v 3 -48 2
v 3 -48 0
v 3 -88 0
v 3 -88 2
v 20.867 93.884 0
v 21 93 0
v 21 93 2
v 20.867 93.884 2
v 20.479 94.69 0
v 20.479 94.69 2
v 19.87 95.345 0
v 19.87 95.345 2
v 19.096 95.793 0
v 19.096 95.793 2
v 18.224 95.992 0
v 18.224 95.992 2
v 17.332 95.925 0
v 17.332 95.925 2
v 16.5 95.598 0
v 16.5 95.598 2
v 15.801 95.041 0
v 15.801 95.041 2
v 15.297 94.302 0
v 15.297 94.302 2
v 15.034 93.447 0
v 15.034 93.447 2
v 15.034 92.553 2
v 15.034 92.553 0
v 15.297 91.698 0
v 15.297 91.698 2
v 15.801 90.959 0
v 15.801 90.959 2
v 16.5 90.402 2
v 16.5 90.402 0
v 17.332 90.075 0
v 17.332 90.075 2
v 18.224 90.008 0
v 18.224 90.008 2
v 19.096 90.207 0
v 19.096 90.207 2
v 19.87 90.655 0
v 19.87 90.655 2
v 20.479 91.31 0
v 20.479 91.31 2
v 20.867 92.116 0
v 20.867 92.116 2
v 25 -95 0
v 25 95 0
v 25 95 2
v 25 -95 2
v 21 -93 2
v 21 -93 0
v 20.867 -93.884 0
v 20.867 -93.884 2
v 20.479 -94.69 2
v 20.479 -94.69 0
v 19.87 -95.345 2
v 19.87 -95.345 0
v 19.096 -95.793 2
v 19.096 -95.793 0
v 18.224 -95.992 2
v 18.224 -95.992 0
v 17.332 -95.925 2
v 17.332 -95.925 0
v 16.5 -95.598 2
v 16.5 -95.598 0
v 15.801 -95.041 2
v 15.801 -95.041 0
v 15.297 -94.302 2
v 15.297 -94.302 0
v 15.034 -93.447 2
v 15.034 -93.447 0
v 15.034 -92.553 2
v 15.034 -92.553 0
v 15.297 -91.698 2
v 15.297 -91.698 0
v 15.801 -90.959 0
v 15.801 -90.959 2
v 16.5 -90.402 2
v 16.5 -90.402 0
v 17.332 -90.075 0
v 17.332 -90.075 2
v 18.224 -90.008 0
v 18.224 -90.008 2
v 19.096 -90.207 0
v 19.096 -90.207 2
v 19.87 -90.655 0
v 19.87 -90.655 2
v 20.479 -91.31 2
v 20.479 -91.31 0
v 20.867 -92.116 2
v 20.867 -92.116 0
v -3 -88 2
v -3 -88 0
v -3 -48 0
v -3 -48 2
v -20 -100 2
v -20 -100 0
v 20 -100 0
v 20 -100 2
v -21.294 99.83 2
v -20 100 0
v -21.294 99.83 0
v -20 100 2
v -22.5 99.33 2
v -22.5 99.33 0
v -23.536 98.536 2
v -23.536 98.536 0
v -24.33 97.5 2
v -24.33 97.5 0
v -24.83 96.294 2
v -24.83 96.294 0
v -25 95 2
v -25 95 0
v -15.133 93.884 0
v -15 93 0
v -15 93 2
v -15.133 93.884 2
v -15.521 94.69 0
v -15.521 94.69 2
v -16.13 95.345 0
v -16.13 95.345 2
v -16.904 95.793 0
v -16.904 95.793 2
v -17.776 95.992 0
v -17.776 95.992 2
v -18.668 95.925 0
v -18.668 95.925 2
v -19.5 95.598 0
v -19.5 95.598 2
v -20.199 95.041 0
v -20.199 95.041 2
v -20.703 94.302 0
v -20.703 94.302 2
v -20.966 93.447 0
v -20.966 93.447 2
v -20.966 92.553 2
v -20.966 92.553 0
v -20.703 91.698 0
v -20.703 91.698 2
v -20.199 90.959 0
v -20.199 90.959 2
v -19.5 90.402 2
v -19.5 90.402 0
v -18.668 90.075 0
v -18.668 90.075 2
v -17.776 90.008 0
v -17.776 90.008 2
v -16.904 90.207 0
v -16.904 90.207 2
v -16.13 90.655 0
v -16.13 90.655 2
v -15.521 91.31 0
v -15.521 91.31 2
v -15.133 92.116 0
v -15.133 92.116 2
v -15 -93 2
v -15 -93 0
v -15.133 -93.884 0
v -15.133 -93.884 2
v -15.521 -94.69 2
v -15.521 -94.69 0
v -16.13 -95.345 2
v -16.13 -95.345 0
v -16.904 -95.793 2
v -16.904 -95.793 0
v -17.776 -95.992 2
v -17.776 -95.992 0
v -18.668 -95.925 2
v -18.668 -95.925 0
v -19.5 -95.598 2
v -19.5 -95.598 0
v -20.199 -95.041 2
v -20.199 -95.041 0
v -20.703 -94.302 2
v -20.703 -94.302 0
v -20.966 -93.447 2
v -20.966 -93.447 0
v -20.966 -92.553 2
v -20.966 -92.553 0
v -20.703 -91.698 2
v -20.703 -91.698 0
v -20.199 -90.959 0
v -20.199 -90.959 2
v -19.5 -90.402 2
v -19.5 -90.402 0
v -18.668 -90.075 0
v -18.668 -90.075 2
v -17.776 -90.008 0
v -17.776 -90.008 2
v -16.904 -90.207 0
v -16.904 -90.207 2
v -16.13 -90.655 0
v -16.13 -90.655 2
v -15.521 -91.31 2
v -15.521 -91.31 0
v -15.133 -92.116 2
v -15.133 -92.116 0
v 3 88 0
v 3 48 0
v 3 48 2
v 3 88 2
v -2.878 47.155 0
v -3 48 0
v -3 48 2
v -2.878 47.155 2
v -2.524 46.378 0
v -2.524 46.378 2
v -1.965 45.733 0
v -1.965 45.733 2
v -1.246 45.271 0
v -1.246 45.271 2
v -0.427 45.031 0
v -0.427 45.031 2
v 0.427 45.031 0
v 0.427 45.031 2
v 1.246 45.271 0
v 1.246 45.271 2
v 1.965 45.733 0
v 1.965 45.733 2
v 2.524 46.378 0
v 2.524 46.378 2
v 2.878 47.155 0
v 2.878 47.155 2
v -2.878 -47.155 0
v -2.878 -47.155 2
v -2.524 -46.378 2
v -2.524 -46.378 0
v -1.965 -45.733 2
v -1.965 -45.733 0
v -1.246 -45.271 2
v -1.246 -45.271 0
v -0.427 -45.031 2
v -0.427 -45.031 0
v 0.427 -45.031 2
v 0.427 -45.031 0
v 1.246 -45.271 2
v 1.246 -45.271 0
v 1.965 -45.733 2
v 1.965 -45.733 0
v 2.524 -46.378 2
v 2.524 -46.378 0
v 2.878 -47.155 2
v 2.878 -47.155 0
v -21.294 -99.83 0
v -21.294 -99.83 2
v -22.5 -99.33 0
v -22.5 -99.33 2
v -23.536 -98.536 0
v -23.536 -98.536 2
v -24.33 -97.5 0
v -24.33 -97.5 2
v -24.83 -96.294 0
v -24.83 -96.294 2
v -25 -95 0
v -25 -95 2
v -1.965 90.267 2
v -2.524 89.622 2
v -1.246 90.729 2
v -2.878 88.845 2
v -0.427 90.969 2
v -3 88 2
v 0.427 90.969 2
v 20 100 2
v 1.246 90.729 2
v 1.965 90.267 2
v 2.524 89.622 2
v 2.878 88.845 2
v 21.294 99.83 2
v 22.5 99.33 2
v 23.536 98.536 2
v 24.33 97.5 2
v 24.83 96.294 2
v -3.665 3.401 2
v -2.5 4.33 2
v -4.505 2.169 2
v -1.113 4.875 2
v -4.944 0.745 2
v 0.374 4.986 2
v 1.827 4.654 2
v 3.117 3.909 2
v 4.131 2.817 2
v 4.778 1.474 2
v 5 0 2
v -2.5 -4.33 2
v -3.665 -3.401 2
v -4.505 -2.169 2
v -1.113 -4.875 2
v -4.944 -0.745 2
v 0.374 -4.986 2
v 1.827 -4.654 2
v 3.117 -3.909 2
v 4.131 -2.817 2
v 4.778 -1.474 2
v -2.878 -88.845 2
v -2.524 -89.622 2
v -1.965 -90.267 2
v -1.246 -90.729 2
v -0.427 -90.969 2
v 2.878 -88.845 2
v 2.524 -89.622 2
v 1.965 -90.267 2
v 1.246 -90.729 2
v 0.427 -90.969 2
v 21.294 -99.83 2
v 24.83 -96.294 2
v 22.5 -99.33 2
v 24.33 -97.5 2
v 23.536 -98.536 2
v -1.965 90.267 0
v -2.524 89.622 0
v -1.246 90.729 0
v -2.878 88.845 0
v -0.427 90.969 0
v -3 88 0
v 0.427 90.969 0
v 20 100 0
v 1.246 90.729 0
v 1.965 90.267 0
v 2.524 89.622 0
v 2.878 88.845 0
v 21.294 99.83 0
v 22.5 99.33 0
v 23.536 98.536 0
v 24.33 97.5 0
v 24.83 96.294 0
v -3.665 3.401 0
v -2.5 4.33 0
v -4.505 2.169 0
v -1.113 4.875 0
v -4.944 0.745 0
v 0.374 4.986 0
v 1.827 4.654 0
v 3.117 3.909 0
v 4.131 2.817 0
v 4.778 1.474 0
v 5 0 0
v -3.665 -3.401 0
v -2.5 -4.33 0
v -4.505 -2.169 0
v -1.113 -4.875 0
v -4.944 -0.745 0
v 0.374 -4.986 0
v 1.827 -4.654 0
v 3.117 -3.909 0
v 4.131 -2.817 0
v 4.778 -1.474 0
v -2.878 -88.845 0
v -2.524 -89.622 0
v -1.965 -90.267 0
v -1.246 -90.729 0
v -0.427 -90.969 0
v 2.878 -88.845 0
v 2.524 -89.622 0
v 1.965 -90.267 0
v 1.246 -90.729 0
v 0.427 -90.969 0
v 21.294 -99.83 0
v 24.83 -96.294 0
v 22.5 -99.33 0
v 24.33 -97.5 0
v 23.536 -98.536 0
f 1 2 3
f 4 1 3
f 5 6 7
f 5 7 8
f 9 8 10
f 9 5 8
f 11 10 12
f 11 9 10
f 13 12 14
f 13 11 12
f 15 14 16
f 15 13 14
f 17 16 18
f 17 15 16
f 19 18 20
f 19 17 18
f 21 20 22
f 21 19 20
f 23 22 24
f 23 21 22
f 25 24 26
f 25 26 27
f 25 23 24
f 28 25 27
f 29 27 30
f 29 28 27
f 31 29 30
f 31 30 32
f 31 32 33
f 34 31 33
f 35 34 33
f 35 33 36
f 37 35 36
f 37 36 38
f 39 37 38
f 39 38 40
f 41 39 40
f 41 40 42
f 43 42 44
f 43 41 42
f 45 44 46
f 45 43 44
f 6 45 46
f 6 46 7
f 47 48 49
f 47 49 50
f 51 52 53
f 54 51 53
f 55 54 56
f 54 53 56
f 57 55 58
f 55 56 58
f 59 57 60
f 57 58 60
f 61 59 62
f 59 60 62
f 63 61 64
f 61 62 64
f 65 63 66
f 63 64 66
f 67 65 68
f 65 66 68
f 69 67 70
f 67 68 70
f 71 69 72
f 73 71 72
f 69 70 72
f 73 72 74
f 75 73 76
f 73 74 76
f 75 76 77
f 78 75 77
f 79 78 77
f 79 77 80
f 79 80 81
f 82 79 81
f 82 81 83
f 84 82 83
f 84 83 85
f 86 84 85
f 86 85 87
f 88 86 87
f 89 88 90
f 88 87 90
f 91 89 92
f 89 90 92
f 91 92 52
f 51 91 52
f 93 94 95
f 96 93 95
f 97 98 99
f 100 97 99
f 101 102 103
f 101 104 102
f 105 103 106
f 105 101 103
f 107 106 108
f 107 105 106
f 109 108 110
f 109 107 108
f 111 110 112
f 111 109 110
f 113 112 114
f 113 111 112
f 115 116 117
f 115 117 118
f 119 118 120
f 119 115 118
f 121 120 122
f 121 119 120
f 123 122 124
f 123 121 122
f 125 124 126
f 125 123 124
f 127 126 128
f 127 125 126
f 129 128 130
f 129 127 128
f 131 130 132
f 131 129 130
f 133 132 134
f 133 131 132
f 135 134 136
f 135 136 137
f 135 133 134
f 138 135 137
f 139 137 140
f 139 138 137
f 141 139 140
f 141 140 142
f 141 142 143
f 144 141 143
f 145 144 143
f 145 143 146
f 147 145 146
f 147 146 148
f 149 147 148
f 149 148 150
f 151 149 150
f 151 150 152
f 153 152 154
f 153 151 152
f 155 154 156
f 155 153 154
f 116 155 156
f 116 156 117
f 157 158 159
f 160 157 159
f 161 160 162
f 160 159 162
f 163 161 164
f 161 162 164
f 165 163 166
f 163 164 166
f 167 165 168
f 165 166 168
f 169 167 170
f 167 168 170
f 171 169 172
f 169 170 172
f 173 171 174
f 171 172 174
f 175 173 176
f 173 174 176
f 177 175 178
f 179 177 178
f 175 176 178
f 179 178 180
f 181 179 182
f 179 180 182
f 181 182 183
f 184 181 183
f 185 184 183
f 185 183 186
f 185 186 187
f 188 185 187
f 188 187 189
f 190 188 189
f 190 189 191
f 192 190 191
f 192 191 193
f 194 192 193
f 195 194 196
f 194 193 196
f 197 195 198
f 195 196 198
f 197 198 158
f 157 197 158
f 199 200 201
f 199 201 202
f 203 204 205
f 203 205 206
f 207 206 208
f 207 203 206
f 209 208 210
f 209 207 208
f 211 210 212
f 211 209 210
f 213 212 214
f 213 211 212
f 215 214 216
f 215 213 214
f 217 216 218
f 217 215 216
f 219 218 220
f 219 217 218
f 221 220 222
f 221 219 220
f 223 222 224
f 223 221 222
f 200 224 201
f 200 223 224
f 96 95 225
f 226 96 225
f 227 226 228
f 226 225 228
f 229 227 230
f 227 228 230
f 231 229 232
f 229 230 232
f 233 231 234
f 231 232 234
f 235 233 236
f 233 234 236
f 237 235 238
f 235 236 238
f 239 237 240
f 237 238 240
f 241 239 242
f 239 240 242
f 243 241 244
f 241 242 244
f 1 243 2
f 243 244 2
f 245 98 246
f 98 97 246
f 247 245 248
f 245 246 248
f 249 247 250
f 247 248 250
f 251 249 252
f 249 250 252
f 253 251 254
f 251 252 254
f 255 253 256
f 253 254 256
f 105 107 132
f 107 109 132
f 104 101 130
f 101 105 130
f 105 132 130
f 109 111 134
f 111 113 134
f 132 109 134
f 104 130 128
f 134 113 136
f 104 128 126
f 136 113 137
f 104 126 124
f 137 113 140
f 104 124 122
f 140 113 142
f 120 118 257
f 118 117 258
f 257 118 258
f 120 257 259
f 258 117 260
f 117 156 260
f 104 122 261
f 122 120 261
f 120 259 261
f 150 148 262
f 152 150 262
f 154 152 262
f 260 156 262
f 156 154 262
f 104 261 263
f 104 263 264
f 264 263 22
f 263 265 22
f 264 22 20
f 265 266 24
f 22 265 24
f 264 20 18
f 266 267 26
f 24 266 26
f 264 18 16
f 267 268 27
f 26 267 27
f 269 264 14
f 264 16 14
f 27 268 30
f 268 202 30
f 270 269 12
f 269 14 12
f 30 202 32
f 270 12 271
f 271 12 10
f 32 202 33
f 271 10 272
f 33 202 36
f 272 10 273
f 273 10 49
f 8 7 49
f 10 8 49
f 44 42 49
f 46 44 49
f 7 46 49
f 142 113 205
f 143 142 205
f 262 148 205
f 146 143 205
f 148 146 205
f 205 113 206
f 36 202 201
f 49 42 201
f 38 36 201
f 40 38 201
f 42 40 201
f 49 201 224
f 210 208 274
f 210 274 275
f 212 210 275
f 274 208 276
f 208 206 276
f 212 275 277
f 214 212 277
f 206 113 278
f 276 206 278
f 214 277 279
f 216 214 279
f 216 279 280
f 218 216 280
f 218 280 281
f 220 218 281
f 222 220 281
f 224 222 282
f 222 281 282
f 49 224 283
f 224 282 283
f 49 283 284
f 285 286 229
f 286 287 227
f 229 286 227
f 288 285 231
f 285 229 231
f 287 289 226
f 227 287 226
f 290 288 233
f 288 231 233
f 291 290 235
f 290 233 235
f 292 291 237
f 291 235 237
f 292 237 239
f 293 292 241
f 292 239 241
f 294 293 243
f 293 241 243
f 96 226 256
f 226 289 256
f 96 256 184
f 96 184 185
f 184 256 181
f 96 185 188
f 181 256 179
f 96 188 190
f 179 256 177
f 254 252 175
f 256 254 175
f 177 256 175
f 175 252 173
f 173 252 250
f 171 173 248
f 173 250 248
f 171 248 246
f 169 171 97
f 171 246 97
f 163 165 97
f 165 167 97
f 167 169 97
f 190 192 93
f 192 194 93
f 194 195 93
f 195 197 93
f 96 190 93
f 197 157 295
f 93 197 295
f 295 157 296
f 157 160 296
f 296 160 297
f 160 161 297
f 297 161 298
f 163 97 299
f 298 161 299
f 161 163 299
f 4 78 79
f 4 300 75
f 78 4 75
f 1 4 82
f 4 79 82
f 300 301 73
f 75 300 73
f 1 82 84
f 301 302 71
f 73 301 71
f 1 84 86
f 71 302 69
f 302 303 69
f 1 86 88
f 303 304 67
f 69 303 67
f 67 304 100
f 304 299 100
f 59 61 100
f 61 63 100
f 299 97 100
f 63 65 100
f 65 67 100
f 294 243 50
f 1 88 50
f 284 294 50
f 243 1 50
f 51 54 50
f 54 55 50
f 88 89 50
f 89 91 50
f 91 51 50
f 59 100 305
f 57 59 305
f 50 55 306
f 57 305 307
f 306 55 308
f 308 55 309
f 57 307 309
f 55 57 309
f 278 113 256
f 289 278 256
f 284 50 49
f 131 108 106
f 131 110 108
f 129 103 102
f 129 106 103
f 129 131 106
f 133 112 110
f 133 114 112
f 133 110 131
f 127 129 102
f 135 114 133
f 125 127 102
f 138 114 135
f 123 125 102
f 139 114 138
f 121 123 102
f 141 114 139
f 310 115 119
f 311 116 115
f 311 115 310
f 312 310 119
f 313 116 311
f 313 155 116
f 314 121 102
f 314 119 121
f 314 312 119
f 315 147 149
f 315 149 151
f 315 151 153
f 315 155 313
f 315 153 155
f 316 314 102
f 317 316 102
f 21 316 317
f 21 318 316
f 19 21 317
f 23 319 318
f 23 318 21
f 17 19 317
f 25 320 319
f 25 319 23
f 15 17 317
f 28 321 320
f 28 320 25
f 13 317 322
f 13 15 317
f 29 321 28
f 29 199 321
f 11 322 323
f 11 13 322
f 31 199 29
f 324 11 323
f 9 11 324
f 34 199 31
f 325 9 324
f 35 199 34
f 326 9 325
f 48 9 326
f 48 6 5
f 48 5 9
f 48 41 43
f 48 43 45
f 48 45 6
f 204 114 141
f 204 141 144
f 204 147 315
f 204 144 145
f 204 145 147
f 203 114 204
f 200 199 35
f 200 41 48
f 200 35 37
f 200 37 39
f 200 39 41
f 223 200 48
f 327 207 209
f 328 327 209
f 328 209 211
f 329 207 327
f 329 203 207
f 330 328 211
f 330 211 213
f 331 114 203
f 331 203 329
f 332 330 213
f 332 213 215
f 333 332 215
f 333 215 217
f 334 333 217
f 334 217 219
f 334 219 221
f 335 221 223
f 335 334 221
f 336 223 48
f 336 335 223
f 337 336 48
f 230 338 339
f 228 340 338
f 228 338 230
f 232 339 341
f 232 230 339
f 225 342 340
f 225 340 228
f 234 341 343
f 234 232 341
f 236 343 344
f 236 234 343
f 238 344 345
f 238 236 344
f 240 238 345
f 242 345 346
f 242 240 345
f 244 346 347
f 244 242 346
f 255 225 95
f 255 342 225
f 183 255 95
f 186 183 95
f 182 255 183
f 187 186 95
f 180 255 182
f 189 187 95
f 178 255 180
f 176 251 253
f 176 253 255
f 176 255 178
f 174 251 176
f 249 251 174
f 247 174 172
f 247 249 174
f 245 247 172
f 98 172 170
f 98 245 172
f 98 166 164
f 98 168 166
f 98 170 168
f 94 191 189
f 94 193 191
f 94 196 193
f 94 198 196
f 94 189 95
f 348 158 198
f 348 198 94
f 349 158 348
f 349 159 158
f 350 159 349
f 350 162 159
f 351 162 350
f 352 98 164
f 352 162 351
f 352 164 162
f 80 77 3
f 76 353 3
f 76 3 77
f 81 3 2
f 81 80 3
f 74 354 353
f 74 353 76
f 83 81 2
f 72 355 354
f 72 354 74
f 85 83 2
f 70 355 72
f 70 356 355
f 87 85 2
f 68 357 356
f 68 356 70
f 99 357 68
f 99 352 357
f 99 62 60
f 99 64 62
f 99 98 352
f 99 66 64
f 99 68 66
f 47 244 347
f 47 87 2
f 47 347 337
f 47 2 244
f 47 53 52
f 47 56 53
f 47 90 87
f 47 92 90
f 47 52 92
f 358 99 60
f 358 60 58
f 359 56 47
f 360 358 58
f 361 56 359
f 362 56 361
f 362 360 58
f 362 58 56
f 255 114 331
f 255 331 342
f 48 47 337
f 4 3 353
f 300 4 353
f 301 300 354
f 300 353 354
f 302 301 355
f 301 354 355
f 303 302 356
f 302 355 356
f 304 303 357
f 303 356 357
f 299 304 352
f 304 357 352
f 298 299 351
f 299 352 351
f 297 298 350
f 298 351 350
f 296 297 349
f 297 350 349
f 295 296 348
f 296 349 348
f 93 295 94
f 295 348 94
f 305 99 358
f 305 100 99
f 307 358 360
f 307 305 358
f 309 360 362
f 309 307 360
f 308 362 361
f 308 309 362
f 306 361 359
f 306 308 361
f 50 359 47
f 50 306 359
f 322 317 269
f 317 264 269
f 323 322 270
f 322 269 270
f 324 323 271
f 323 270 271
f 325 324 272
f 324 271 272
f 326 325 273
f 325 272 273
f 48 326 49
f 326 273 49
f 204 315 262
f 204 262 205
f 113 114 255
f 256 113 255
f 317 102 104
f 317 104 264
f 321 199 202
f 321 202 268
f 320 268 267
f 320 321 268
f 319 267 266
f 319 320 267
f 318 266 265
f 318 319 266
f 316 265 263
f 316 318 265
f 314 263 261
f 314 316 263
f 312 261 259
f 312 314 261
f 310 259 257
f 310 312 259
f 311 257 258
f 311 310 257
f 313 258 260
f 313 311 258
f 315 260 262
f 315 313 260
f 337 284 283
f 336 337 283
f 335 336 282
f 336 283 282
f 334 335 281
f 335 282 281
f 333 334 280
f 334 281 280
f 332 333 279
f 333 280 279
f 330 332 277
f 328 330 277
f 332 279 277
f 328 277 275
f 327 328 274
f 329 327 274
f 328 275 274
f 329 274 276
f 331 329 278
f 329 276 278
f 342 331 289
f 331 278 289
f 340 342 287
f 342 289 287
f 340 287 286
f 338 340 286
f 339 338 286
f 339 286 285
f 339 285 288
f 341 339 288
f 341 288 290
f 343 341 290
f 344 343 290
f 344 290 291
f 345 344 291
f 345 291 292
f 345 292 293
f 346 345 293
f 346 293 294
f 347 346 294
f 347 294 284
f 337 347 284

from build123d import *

# Parameters (mm, degrees)
SCHIZZO1_W                   = 50
SCHIZZO1_H                   = 100
SCHIZZO1_R                   = 3
ESTRUSIONE_ESTRUSIONE1_DEPTH = 2
RACCORDO3_R                  = 5
RACCORDO4_R                  = 5
SCHIZZO3_R                   = 5
TAGLIO_ESTRUSIONE1_DEPTH     = 104.097041665


with BuildPart() as part:
    # Schizzo1 → Estrusione-Estrusione1 (new body)
    with BuildSketch(Plane.XY):
        with Locations((0, 50)):
            Rectangle(SCHIZZO1_W, SCHIZZO1_H)
        with Locations((-18, 93)):
            Circle(SCHIZZO1_R, mode=Mode.SUBTRACT)
        with Locations((18, 93)):
            Circle(SCHIZZO1_R, mode=Mode.SUBTRACT)
        with BuildLine():
            Line((-3, 88), (-3, 48))
            ThreePointArc((-3, 48), (0, 45), (3, 48))
            Line((3, 48), (3, 88))
            ThreePointArc((3, 88), (0, 91), (-3, 88))
        make_face(mode=Mode.SUBTRACT)
    extrude(amount=ESTRUSIONE_ESTRUSIONE1_DEPTH)

    # Raccordo3
    raccordo3_edges = [part.edges().sort_by_distance(p)[0] for p in [
        (25, 100, 1),
    ]]
    fillet(raccordo3_edges, radius=RACCORDO3_R)

    # Raccordo4
    raccordo4_edges = [part.edges().sort_by_distance(p)[0] for p in [
        (-25, 100, 1),
    ]]
    fillet(raccordo4_edges, radius=RACCORDO4_R)

    # Specchia1: part across plane


with BuildPart() as part_1:
    add(part.part)
    add(part.part.mirror(Plane(origin=(-25, 0, 2), x_dir=(0, 0, 1), z_dir=(0, 1, 0))))

    # Schizzo3 → Taglio-Estrusione1 (cut, through all)
    with BuildSketch(Plane.XY.offset(2)):
        Circle(SCHIZZO3_R)
    extrude(amount=-TAGLIO_ESTRUSIONE1_DEPTH, mode=Mode.SUBTRACT)


solid = part_1.part
